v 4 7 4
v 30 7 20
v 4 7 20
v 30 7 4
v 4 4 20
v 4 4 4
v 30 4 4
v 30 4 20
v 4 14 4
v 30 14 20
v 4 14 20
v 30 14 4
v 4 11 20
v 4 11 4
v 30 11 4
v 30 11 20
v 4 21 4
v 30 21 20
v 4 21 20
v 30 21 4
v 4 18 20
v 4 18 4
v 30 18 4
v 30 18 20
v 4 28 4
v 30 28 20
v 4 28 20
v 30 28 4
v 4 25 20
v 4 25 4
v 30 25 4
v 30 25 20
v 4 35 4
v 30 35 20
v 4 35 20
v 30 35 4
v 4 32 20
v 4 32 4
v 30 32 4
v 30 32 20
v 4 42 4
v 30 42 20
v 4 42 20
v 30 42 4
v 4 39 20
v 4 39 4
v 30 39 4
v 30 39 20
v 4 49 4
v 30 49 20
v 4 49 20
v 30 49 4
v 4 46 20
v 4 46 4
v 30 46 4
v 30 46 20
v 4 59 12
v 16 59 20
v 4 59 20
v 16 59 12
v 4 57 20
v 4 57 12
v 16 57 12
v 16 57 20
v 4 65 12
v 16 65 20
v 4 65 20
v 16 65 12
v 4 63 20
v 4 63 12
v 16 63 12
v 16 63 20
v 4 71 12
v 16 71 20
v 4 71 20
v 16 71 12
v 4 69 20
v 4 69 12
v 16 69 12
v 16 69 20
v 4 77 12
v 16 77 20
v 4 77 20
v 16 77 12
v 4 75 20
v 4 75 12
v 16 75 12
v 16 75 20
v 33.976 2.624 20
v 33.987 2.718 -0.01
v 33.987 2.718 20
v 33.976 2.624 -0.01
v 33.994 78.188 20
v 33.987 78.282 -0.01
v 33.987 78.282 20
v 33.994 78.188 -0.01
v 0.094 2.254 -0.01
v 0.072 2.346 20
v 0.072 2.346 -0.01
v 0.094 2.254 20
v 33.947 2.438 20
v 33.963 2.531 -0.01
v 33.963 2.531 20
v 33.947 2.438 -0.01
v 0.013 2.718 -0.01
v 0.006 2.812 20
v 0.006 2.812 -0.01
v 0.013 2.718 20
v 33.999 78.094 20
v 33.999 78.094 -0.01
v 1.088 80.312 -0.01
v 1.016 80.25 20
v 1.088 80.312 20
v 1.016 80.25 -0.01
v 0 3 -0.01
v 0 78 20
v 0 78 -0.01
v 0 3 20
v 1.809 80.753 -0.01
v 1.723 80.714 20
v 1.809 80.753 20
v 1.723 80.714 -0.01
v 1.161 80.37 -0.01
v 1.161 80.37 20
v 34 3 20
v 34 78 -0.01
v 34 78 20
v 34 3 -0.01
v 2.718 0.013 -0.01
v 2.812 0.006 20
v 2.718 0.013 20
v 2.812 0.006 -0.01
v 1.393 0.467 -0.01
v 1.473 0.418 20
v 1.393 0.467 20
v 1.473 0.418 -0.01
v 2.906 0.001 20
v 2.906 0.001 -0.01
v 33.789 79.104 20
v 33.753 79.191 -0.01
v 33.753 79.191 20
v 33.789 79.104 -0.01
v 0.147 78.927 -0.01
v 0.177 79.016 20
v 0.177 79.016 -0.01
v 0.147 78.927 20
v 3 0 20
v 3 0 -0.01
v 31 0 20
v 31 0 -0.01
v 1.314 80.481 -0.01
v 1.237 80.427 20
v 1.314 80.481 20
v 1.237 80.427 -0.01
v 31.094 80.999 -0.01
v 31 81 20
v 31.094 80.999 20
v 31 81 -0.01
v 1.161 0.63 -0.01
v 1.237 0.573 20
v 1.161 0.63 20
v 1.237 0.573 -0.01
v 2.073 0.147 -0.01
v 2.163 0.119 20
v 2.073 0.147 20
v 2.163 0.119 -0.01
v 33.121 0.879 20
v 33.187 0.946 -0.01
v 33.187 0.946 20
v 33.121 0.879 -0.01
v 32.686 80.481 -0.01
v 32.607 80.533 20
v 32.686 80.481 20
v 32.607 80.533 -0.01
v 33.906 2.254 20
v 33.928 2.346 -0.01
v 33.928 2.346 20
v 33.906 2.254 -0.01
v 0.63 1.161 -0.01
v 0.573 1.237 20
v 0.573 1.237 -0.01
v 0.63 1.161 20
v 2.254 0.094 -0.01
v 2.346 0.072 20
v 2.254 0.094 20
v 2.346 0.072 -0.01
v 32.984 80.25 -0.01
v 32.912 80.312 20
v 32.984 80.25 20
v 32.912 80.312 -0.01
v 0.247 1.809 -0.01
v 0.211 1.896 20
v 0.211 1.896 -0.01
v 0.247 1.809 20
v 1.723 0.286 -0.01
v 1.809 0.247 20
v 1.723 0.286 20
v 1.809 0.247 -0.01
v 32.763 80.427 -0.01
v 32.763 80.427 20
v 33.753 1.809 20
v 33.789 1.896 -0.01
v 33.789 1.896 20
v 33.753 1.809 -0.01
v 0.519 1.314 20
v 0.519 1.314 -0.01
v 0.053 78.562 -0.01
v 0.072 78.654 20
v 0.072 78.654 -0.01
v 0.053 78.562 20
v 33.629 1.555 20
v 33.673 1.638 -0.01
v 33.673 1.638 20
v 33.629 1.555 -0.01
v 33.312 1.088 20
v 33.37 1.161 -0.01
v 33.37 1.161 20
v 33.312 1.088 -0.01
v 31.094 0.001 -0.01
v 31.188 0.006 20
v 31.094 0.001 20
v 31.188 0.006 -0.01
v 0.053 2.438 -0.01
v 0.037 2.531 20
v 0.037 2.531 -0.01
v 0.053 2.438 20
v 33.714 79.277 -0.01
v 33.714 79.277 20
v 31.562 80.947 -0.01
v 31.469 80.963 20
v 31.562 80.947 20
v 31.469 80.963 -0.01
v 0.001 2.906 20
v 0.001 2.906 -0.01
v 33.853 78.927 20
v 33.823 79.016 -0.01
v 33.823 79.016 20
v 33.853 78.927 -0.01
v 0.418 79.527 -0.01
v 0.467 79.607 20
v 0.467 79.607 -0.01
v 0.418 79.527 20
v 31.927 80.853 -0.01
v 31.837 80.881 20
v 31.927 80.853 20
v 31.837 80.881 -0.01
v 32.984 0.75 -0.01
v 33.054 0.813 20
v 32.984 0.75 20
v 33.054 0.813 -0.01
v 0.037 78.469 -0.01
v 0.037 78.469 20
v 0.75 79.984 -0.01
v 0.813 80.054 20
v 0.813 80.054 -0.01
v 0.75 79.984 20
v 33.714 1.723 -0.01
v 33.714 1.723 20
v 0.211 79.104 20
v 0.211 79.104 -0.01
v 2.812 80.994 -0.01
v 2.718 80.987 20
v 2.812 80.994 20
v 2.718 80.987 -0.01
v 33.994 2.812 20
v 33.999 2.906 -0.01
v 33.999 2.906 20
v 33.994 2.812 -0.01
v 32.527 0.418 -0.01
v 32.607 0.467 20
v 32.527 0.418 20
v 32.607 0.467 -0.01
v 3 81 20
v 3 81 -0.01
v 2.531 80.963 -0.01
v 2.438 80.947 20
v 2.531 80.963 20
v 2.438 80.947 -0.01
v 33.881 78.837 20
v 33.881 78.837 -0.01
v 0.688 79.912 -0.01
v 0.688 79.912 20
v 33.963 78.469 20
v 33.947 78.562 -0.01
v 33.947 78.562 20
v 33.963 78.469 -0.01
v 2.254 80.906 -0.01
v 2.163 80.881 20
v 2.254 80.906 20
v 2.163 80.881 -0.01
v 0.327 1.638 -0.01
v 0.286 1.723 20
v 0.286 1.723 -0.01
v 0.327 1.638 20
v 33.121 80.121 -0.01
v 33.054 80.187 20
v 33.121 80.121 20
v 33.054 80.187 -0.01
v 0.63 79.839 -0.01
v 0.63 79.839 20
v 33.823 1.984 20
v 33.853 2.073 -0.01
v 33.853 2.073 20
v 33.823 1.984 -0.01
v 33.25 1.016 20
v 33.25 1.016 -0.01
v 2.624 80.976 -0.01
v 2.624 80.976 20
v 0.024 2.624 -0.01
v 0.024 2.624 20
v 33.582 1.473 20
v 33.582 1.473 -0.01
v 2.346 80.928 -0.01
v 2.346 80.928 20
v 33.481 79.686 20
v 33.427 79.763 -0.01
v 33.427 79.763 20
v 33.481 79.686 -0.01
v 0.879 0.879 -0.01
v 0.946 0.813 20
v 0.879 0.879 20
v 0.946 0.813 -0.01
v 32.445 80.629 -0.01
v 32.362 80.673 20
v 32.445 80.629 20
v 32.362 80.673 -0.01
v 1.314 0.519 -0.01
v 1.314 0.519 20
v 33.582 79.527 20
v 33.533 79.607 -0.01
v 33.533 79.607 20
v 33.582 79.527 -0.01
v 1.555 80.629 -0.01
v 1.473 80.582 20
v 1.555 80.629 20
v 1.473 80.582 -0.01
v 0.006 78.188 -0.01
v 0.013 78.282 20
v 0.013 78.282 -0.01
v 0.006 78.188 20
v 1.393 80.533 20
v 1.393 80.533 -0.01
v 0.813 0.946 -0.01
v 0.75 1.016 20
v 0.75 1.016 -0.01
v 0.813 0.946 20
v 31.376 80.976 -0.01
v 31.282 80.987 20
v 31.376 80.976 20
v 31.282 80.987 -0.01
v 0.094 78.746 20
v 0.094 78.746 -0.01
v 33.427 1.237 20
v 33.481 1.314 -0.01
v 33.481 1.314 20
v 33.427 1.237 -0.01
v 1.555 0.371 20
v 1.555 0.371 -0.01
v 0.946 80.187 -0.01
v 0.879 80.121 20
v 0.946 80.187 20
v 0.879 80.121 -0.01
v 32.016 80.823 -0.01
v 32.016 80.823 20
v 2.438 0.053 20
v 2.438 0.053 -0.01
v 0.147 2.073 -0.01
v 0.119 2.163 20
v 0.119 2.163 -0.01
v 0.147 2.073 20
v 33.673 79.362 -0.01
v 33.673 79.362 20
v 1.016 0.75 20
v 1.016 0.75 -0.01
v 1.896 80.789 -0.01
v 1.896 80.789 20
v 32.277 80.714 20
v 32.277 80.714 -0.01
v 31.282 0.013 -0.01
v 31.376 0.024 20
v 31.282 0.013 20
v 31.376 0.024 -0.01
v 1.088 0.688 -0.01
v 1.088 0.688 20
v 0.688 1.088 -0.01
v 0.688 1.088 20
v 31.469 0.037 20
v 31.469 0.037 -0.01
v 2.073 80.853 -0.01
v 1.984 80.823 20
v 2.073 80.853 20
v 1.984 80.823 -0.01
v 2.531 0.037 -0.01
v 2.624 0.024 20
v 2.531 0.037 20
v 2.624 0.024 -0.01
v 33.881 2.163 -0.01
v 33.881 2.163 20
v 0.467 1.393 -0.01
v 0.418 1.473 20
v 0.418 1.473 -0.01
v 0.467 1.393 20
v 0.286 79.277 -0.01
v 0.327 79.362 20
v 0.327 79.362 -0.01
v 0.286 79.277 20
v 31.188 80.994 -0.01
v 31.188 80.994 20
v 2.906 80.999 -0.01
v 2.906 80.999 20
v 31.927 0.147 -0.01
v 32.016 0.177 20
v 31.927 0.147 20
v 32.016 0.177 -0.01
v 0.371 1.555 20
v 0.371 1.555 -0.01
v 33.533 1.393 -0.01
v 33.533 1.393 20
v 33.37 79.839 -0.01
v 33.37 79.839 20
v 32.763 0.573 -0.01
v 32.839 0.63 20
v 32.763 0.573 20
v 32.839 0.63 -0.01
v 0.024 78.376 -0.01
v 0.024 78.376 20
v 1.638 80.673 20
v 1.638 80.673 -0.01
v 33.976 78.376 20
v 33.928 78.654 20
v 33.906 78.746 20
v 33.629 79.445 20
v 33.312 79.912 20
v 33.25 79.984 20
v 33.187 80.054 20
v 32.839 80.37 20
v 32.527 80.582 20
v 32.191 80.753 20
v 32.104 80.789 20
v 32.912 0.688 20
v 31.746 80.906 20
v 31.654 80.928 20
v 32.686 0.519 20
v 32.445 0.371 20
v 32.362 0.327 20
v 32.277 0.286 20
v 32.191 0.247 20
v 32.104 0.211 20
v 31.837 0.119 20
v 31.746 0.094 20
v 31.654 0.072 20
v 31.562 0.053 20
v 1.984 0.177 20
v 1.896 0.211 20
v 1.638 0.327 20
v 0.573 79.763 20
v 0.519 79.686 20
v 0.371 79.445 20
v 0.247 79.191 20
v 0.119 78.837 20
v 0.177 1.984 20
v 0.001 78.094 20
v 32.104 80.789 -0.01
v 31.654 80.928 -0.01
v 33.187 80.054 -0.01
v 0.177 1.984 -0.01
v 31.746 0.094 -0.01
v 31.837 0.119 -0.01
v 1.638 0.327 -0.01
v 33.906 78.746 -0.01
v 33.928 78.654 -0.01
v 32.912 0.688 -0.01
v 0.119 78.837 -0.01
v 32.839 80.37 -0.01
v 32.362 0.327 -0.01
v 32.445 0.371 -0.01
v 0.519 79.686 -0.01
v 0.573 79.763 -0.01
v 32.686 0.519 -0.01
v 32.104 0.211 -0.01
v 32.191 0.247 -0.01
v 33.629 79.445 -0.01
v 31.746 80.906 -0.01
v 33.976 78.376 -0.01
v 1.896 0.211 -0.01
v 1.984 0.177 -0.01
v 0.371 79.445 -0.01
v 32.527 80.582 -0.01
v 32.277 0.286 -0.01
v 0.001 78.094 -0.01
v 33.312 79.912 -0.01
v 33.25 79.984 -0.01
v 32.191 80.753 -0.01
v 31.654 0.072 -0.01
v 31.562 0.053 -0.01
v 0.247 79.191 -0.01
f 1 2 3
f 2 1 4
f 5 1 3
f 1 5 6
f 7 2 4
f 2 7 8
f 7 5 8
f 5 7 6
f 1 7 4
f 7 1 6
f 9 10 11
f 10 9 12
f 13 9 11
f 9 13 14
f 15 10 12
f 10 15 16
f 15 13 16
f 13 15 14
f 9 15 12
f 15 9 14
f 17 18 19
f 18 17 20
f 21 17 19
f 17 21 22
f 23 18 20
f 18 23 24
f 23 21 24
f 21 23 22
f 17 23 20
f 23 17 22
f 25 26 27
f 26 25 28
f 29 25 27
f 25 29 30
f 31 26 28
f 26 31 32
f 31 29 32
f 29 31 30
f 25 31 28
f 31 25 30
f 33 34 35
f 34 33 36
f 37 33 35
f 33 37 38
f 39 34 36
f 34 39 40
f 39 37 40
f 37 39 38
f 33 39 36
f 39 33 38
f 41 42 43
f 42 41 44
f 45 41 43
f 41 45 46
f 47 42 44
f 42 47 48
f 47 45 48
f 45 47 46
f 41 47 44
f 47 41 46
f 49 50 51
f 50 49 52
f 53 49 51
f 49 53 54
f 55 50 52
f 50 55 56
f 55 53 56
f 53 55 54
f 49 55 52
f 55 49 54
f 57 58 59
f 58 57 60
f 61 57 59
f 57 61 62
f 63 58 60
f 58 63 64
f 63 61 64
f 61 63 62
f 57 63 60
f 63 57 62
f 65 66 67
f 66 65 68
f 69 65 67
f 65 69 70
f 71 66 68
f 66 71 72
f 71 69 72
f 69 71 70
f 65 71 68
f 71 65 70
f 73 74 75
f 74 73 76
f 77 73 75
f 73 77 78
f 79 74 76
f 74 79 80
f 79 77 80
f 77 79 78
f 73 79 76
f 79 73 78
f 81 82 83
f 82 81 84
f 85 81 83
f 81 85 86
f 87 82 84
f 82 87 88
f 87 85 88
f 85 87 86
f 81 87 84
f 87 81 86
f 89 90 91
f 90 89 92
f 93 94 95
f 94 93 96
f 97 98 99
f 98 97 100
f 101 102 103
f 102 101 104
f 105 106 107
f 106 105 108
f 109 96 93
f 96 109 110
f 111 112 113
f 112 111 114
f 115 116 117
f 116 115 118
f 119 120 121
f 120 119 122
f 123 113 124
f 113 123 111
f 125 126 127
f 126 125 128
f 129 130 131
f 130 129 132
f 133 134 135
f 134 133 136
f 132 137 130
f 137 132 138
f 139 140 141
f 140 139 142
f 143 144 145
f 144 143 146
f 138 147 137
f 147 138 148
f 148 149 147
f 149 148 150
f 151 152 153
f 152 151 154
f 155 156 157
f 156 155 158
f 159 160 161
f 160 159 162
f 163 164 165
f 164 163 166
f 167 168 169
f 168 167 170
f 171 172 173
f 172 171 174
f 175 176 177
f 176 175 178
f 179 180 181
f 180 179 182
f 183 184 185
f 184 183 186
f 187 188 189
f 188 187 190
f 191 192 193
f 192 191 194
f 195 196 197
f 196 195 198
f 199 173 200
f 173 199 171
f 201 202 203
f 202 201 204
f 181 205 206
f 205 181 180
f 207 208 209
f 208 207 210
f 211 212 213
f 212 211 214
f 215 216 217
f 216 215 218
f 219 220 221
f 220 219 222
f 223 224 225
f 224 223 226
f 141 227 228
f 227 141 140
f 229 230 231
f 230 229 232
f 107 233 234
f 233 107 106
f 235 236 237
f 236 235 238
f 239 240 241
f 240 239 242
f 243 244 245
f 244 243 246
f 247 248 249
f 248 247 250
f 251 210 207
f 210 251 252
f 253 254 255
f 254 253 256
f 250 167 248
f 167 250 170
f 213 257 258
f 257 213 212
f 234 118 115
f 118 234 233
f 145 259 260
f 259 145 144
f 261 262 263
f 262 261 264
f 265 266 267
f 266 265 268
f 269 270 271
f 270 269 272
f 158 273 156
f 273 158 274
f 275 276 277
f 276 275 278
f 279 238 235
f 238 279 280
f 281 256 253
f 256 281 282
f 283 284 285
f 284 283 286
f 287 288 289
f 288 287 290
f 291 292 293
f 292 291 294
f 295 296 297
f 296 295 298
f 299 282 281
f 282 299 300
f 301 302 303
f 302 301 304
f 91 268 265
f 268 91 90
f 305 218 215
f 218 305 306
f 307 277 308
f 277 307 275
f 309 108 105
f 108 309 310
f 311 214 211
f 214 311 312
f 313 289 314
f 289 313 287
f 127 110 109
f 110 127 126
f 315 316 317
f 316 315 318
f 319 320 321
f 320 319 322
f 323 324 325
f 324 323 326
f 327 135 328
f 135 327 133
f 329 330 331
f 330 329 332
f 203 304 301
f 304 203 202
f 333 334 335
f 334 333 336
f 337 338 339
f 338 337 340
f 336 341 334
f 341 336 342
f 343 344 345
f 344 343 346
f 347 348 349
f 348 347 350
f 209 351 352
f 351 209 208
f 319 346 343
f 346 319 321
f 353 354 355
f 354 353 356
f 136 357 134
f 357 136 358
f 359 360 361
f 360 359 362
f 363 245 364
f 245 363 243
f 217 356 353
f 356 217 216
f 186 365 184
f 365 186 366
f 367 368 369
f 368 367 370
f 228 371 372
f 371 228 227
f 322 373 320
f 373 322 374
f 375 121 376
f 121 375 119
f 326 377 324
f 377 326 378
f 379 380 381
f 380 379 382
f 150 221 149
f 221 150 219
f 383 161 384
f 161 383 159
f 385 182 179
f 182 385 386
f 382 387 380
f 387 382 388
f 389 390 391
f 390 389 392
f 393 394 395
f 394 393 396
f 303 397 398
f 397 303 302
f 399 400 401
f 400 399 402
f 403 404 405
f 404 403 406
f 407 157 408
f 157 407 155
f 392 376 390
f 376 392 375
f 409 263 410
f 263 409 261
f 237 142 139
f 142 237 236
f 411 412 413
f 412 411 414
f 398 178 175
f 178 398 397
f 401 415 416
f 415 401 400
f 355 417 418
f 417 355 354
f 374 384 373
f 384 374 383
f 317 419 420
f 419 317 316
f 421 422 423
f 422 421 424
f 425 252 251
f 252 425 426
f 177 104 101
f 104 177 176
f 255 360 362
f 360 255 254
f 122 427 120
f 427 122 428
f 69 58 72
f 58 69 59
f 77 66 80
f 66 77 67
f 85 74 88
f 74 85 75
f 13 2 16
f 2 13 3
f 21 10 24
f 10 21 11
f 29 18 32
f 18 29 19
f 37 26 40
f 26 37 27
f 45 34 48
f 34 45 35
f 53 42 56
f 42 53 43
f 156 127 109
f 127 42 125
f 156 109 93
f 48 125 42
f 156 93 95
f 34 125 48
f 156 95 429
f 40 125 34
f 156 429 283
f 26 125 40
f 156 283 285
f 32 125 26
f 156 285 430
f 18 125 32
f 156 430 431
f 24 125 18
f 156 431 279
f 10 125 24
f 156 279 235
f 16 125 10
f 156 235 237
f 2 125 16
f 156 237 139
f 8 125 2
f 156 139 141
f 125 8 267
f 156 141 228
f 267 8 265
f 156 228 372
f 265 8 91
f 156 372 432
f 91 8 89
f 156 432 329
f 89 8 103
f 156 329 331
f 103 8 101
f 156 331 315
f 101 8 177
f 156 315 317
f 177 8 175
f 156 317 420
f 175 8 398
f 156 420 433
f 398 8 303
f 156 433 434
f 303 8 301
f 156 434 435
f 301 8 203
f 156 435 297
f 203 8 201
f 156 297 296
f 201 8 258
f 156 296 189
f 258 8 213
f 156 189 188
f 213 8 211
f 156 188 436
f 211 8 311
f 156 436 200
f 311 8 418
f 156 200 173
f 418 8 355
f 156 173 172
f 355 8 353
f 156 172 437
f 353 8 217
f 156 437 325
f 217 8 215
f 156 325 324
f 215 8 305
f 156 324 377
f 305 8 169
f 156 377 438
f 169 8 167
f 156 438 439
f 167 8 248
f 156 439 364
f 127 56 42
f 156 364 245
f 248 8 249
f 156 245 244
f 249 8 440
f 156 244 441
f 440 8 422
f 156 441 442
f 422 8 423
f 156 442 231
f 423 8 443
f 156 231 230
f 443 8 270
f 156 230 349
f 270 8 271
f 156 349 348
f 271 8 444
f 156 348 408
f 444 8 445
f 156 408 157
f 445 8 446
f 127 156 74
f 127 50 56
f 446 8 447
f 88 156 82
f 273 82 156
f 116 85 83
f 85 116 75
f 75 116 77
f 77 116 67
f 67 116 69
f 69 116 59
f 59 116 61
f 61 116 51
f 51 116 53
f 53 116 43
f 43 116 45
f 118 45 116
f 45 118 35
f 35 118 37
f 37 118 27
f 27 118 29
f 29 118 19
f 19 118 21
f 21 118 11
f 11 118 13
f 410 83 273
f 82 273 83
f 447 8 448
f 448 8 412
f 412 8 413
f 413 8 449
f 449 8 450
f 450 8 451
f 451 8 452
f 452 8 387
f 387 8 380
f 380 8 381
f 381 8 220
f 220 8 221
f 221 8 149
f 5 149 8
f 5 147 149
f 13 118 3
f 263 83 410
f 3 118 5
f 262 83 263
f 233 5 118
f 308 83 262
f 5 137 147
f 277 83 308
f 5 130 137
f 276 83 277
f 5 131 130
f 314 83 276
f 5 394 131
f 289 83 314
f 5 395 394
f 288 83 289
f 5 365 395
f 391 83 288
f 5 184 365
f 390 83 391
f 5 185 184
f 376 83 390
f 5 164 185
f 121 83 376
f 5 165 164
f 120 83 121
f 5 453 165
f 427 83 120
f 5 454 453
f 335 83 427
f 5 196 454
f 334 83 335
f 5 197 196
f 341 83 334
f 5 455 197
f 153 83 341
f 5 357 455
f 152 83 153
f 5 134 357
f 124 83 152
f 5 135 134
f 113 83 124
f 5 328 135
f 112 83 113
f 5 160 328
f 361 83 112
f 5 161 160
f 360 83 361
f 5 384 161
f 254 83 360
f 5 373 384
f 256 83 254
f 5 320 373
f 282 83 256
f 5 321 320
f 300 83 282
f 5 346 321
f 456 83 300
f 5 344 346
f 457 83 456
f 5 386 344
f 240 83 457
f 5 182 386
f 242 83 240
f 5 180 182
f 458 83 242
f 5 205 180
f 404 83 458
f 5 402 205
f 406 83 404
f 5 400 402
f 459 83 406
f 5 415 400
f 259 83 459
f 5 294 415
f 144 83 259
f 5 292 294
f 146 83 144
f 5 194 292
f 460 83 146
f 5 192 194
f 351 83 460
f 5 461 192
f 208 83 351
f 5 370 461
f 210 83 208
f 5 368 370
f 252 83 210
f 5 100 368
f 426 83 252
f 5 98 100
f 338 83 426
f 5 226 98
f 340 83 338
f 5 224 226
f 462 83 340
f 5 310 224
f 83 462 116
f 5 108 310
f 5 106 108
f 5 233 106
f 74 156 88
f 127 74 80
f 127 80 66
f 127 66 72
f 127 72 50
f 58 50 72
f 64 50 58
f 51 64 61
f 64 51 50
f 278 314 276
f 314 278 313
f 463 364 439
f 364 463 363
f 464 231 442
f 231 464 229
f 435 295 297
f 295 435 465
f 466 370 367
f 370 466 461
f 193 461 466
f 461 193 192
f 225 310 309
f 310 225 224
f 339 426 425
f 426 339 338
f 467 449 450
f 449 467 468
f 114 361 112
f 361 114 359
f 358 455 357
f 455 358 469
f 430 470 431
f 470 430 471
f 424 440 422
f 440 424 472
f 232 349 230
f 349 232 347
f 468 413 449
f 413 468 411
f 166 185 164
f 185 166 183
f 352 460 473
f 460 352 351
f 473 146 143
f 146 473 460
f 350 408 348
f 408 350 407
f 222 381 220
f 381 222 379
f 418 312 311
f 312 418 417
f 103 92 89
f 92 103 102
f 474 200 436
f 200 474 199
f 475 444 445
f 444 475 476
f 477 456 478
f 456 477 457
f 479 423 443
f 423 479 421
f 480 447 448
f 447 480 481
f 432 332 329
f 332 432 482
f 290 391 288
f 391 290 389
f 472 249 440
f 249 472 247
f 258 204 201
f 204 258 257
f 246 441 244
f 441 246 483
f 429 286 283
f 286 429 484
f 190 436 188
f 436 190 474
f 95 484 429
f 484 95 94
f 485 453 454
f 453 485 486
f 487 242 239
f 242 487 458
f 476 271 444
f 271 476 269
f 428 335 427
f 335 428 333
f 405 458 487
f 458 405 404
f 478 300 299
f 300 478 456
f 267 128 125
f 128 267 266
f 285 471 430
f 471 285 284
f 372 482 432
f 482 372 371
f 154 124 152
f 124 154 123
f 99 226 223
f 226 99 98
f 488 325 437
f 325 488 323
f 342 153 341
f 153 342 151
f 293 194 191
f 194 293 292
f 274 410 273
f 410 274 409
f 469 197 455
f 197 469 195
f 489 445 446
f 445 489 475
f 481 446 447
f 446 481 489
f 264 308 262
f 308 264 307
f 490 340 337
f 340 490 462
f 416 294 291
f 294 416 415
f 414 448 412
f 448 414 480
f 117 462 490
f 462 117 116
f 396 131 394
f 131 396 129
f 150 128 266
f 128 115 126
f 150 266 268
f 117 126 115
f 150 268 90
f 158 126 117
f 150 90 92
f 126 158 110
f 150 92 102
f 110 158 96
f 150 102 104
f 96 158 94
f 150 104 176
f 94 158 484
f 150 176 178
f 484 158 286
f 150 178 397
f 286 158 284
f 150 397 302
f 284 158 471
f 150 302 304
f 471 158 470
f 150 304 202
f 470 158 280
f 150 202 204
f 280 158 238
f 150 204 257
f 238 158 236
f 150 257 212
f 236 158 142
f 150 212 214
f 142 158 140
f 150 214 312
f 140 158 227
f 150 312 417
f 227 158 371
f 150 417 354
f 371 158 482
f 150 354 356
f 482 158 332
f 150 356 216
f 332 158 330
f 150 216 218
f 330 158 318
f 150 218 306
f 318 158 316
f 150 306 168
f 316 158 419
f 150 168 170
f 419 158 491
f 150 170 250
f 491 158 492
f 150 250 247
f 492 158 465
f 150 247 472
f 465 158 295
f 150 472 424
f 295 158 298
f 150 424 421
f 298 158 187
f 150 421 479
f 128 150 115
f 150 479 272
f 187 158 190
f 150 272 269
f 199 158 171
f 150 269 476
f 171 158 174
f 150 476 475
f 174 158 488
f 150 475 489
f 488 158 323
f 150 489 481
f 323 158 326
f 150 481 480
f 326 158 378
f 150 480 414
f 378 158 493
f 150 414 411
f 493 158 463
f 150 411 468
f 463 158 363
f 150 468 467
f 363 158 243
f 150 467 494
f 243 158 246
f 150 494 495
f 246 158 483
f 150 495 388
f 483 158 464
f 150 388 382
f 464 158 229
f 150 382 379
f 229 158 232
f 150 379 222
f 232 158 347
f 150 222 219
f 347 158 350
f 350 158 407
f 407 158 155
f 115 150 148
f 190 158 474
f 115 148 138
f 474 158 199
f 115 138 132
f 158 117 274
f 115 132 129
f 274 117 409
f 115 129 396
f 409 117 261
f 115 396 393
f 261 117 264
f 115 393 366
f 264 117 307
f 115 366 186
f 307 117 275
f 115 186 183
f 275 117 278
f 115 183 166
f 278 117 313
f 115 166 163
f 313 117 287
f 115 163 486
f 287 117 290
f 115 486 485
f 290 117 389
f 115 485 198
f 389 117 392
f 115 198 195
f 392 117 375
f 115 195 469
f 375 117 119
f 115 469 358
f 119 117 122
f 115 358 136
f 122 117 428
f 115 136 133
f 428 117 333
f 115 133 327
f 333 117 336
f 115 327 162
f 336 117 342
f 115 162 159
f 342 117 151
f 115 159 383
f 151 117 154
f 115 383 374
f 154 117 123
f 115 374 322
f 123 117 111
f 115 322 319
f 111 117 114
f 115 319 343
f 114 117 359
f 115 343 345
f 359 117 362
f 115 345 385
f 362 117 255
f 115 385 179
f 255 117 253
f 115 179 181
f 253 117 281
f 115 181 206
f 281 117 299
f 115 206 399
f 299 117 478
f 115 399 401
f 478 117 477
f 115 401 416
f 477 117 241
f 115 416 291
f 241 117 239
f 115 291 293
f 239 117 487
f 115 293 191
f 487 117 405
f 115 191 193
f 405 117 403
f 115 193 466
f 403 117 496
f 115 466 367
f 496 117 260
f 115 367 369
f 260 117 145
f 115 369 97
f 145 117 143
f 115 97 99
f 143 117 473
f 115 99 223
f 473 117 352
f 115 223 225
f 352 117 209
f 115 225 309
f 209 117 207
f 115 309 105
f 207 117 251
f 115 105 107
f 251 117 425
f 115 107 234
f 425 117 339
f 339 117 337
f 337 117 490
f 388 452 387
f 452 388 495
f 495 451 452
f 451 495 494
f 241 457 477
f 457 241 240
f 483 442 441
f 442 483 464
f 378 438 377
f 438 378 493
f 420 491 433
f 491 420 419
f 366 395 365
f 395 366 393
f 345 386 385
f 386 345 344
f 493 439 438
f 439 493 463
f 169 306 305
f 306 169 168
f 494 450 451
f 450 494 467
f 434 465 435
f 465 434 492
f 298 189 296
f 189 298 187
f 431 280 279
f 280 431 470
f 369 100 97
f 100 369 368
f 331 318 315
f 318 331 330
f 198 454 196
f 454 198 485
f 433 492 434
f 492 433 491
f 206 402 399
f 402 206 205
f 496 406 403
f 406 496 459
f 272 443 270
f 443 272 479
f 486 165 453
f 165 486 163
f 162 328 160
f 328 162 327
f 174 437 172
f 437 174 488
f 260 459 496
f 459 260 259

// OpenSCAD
border = 4; // border around slots
cornerRadius = 3;

sdhcSlots = 7;
sdhcY = 26; // 24 wide
sdhcX = 3; // 2.1 thick long
sdhcZ = 16; // half of 32 high

microsdSlots = 4;
microsdY = 12; // 11 wide
microsdX = 2; // 1 thick
microsdZ = 8; // half of 15 high

holderX = border + sdhcX*sdhcSlots + border*sdhcSlots + microsdX*microsdSlots + border*microsdSlots;
holderY = sdhcY + 2*border;
holderZ = sdhcZ + border;

translate([holderY-cornerRadius,cornerRadius,holderZ]) {
    rotate([180,0,180]) {
        difference() {
            // rounded box
            if ((sdhcSlots > 0) && (microsdSlots > 0)) {
                roundedBox(holderX+border, holderY, holderZ, cornerRadius);
            }
            else {
                roundedBox(holderX, holderY, holderZ, cornerRadius);
            }

            // sdhc slot holes
            rotate([90,0,90])
                slots(sdhcY, sdhcX, sdhcZ, sdhcSlots);

            // microsd slot holes
            translate([sdhcY-microsdY, border + sdhcX*sdhcSlots + border*sdhcSlots, 0])
                rotate([90,0,90])
                    slots(microsdY, microsdX, microsdZ, microsdSlots);
        }
    }
}

// functions
module roundedBox(length, width, height, radius)
{
    dRadius = 2*radius;
    minkowski() {
        cube(size=[width-dRadius,length-dRadius, height]);
        cylinder(r=radius, h=0.01, $fn=200);
    }
}

module slots(Y,X,Z,numslots) {
    if (numslots > 0) {
        for (i = [0 : numslots-1]) {
            translate([i*(border+X), 0])
                translate([border-cornerRadius, -border,-cornerRadius])
                    translate([0,0,border])
                        cube(size=[X, Z+border, Y]);
        }
    }
}
